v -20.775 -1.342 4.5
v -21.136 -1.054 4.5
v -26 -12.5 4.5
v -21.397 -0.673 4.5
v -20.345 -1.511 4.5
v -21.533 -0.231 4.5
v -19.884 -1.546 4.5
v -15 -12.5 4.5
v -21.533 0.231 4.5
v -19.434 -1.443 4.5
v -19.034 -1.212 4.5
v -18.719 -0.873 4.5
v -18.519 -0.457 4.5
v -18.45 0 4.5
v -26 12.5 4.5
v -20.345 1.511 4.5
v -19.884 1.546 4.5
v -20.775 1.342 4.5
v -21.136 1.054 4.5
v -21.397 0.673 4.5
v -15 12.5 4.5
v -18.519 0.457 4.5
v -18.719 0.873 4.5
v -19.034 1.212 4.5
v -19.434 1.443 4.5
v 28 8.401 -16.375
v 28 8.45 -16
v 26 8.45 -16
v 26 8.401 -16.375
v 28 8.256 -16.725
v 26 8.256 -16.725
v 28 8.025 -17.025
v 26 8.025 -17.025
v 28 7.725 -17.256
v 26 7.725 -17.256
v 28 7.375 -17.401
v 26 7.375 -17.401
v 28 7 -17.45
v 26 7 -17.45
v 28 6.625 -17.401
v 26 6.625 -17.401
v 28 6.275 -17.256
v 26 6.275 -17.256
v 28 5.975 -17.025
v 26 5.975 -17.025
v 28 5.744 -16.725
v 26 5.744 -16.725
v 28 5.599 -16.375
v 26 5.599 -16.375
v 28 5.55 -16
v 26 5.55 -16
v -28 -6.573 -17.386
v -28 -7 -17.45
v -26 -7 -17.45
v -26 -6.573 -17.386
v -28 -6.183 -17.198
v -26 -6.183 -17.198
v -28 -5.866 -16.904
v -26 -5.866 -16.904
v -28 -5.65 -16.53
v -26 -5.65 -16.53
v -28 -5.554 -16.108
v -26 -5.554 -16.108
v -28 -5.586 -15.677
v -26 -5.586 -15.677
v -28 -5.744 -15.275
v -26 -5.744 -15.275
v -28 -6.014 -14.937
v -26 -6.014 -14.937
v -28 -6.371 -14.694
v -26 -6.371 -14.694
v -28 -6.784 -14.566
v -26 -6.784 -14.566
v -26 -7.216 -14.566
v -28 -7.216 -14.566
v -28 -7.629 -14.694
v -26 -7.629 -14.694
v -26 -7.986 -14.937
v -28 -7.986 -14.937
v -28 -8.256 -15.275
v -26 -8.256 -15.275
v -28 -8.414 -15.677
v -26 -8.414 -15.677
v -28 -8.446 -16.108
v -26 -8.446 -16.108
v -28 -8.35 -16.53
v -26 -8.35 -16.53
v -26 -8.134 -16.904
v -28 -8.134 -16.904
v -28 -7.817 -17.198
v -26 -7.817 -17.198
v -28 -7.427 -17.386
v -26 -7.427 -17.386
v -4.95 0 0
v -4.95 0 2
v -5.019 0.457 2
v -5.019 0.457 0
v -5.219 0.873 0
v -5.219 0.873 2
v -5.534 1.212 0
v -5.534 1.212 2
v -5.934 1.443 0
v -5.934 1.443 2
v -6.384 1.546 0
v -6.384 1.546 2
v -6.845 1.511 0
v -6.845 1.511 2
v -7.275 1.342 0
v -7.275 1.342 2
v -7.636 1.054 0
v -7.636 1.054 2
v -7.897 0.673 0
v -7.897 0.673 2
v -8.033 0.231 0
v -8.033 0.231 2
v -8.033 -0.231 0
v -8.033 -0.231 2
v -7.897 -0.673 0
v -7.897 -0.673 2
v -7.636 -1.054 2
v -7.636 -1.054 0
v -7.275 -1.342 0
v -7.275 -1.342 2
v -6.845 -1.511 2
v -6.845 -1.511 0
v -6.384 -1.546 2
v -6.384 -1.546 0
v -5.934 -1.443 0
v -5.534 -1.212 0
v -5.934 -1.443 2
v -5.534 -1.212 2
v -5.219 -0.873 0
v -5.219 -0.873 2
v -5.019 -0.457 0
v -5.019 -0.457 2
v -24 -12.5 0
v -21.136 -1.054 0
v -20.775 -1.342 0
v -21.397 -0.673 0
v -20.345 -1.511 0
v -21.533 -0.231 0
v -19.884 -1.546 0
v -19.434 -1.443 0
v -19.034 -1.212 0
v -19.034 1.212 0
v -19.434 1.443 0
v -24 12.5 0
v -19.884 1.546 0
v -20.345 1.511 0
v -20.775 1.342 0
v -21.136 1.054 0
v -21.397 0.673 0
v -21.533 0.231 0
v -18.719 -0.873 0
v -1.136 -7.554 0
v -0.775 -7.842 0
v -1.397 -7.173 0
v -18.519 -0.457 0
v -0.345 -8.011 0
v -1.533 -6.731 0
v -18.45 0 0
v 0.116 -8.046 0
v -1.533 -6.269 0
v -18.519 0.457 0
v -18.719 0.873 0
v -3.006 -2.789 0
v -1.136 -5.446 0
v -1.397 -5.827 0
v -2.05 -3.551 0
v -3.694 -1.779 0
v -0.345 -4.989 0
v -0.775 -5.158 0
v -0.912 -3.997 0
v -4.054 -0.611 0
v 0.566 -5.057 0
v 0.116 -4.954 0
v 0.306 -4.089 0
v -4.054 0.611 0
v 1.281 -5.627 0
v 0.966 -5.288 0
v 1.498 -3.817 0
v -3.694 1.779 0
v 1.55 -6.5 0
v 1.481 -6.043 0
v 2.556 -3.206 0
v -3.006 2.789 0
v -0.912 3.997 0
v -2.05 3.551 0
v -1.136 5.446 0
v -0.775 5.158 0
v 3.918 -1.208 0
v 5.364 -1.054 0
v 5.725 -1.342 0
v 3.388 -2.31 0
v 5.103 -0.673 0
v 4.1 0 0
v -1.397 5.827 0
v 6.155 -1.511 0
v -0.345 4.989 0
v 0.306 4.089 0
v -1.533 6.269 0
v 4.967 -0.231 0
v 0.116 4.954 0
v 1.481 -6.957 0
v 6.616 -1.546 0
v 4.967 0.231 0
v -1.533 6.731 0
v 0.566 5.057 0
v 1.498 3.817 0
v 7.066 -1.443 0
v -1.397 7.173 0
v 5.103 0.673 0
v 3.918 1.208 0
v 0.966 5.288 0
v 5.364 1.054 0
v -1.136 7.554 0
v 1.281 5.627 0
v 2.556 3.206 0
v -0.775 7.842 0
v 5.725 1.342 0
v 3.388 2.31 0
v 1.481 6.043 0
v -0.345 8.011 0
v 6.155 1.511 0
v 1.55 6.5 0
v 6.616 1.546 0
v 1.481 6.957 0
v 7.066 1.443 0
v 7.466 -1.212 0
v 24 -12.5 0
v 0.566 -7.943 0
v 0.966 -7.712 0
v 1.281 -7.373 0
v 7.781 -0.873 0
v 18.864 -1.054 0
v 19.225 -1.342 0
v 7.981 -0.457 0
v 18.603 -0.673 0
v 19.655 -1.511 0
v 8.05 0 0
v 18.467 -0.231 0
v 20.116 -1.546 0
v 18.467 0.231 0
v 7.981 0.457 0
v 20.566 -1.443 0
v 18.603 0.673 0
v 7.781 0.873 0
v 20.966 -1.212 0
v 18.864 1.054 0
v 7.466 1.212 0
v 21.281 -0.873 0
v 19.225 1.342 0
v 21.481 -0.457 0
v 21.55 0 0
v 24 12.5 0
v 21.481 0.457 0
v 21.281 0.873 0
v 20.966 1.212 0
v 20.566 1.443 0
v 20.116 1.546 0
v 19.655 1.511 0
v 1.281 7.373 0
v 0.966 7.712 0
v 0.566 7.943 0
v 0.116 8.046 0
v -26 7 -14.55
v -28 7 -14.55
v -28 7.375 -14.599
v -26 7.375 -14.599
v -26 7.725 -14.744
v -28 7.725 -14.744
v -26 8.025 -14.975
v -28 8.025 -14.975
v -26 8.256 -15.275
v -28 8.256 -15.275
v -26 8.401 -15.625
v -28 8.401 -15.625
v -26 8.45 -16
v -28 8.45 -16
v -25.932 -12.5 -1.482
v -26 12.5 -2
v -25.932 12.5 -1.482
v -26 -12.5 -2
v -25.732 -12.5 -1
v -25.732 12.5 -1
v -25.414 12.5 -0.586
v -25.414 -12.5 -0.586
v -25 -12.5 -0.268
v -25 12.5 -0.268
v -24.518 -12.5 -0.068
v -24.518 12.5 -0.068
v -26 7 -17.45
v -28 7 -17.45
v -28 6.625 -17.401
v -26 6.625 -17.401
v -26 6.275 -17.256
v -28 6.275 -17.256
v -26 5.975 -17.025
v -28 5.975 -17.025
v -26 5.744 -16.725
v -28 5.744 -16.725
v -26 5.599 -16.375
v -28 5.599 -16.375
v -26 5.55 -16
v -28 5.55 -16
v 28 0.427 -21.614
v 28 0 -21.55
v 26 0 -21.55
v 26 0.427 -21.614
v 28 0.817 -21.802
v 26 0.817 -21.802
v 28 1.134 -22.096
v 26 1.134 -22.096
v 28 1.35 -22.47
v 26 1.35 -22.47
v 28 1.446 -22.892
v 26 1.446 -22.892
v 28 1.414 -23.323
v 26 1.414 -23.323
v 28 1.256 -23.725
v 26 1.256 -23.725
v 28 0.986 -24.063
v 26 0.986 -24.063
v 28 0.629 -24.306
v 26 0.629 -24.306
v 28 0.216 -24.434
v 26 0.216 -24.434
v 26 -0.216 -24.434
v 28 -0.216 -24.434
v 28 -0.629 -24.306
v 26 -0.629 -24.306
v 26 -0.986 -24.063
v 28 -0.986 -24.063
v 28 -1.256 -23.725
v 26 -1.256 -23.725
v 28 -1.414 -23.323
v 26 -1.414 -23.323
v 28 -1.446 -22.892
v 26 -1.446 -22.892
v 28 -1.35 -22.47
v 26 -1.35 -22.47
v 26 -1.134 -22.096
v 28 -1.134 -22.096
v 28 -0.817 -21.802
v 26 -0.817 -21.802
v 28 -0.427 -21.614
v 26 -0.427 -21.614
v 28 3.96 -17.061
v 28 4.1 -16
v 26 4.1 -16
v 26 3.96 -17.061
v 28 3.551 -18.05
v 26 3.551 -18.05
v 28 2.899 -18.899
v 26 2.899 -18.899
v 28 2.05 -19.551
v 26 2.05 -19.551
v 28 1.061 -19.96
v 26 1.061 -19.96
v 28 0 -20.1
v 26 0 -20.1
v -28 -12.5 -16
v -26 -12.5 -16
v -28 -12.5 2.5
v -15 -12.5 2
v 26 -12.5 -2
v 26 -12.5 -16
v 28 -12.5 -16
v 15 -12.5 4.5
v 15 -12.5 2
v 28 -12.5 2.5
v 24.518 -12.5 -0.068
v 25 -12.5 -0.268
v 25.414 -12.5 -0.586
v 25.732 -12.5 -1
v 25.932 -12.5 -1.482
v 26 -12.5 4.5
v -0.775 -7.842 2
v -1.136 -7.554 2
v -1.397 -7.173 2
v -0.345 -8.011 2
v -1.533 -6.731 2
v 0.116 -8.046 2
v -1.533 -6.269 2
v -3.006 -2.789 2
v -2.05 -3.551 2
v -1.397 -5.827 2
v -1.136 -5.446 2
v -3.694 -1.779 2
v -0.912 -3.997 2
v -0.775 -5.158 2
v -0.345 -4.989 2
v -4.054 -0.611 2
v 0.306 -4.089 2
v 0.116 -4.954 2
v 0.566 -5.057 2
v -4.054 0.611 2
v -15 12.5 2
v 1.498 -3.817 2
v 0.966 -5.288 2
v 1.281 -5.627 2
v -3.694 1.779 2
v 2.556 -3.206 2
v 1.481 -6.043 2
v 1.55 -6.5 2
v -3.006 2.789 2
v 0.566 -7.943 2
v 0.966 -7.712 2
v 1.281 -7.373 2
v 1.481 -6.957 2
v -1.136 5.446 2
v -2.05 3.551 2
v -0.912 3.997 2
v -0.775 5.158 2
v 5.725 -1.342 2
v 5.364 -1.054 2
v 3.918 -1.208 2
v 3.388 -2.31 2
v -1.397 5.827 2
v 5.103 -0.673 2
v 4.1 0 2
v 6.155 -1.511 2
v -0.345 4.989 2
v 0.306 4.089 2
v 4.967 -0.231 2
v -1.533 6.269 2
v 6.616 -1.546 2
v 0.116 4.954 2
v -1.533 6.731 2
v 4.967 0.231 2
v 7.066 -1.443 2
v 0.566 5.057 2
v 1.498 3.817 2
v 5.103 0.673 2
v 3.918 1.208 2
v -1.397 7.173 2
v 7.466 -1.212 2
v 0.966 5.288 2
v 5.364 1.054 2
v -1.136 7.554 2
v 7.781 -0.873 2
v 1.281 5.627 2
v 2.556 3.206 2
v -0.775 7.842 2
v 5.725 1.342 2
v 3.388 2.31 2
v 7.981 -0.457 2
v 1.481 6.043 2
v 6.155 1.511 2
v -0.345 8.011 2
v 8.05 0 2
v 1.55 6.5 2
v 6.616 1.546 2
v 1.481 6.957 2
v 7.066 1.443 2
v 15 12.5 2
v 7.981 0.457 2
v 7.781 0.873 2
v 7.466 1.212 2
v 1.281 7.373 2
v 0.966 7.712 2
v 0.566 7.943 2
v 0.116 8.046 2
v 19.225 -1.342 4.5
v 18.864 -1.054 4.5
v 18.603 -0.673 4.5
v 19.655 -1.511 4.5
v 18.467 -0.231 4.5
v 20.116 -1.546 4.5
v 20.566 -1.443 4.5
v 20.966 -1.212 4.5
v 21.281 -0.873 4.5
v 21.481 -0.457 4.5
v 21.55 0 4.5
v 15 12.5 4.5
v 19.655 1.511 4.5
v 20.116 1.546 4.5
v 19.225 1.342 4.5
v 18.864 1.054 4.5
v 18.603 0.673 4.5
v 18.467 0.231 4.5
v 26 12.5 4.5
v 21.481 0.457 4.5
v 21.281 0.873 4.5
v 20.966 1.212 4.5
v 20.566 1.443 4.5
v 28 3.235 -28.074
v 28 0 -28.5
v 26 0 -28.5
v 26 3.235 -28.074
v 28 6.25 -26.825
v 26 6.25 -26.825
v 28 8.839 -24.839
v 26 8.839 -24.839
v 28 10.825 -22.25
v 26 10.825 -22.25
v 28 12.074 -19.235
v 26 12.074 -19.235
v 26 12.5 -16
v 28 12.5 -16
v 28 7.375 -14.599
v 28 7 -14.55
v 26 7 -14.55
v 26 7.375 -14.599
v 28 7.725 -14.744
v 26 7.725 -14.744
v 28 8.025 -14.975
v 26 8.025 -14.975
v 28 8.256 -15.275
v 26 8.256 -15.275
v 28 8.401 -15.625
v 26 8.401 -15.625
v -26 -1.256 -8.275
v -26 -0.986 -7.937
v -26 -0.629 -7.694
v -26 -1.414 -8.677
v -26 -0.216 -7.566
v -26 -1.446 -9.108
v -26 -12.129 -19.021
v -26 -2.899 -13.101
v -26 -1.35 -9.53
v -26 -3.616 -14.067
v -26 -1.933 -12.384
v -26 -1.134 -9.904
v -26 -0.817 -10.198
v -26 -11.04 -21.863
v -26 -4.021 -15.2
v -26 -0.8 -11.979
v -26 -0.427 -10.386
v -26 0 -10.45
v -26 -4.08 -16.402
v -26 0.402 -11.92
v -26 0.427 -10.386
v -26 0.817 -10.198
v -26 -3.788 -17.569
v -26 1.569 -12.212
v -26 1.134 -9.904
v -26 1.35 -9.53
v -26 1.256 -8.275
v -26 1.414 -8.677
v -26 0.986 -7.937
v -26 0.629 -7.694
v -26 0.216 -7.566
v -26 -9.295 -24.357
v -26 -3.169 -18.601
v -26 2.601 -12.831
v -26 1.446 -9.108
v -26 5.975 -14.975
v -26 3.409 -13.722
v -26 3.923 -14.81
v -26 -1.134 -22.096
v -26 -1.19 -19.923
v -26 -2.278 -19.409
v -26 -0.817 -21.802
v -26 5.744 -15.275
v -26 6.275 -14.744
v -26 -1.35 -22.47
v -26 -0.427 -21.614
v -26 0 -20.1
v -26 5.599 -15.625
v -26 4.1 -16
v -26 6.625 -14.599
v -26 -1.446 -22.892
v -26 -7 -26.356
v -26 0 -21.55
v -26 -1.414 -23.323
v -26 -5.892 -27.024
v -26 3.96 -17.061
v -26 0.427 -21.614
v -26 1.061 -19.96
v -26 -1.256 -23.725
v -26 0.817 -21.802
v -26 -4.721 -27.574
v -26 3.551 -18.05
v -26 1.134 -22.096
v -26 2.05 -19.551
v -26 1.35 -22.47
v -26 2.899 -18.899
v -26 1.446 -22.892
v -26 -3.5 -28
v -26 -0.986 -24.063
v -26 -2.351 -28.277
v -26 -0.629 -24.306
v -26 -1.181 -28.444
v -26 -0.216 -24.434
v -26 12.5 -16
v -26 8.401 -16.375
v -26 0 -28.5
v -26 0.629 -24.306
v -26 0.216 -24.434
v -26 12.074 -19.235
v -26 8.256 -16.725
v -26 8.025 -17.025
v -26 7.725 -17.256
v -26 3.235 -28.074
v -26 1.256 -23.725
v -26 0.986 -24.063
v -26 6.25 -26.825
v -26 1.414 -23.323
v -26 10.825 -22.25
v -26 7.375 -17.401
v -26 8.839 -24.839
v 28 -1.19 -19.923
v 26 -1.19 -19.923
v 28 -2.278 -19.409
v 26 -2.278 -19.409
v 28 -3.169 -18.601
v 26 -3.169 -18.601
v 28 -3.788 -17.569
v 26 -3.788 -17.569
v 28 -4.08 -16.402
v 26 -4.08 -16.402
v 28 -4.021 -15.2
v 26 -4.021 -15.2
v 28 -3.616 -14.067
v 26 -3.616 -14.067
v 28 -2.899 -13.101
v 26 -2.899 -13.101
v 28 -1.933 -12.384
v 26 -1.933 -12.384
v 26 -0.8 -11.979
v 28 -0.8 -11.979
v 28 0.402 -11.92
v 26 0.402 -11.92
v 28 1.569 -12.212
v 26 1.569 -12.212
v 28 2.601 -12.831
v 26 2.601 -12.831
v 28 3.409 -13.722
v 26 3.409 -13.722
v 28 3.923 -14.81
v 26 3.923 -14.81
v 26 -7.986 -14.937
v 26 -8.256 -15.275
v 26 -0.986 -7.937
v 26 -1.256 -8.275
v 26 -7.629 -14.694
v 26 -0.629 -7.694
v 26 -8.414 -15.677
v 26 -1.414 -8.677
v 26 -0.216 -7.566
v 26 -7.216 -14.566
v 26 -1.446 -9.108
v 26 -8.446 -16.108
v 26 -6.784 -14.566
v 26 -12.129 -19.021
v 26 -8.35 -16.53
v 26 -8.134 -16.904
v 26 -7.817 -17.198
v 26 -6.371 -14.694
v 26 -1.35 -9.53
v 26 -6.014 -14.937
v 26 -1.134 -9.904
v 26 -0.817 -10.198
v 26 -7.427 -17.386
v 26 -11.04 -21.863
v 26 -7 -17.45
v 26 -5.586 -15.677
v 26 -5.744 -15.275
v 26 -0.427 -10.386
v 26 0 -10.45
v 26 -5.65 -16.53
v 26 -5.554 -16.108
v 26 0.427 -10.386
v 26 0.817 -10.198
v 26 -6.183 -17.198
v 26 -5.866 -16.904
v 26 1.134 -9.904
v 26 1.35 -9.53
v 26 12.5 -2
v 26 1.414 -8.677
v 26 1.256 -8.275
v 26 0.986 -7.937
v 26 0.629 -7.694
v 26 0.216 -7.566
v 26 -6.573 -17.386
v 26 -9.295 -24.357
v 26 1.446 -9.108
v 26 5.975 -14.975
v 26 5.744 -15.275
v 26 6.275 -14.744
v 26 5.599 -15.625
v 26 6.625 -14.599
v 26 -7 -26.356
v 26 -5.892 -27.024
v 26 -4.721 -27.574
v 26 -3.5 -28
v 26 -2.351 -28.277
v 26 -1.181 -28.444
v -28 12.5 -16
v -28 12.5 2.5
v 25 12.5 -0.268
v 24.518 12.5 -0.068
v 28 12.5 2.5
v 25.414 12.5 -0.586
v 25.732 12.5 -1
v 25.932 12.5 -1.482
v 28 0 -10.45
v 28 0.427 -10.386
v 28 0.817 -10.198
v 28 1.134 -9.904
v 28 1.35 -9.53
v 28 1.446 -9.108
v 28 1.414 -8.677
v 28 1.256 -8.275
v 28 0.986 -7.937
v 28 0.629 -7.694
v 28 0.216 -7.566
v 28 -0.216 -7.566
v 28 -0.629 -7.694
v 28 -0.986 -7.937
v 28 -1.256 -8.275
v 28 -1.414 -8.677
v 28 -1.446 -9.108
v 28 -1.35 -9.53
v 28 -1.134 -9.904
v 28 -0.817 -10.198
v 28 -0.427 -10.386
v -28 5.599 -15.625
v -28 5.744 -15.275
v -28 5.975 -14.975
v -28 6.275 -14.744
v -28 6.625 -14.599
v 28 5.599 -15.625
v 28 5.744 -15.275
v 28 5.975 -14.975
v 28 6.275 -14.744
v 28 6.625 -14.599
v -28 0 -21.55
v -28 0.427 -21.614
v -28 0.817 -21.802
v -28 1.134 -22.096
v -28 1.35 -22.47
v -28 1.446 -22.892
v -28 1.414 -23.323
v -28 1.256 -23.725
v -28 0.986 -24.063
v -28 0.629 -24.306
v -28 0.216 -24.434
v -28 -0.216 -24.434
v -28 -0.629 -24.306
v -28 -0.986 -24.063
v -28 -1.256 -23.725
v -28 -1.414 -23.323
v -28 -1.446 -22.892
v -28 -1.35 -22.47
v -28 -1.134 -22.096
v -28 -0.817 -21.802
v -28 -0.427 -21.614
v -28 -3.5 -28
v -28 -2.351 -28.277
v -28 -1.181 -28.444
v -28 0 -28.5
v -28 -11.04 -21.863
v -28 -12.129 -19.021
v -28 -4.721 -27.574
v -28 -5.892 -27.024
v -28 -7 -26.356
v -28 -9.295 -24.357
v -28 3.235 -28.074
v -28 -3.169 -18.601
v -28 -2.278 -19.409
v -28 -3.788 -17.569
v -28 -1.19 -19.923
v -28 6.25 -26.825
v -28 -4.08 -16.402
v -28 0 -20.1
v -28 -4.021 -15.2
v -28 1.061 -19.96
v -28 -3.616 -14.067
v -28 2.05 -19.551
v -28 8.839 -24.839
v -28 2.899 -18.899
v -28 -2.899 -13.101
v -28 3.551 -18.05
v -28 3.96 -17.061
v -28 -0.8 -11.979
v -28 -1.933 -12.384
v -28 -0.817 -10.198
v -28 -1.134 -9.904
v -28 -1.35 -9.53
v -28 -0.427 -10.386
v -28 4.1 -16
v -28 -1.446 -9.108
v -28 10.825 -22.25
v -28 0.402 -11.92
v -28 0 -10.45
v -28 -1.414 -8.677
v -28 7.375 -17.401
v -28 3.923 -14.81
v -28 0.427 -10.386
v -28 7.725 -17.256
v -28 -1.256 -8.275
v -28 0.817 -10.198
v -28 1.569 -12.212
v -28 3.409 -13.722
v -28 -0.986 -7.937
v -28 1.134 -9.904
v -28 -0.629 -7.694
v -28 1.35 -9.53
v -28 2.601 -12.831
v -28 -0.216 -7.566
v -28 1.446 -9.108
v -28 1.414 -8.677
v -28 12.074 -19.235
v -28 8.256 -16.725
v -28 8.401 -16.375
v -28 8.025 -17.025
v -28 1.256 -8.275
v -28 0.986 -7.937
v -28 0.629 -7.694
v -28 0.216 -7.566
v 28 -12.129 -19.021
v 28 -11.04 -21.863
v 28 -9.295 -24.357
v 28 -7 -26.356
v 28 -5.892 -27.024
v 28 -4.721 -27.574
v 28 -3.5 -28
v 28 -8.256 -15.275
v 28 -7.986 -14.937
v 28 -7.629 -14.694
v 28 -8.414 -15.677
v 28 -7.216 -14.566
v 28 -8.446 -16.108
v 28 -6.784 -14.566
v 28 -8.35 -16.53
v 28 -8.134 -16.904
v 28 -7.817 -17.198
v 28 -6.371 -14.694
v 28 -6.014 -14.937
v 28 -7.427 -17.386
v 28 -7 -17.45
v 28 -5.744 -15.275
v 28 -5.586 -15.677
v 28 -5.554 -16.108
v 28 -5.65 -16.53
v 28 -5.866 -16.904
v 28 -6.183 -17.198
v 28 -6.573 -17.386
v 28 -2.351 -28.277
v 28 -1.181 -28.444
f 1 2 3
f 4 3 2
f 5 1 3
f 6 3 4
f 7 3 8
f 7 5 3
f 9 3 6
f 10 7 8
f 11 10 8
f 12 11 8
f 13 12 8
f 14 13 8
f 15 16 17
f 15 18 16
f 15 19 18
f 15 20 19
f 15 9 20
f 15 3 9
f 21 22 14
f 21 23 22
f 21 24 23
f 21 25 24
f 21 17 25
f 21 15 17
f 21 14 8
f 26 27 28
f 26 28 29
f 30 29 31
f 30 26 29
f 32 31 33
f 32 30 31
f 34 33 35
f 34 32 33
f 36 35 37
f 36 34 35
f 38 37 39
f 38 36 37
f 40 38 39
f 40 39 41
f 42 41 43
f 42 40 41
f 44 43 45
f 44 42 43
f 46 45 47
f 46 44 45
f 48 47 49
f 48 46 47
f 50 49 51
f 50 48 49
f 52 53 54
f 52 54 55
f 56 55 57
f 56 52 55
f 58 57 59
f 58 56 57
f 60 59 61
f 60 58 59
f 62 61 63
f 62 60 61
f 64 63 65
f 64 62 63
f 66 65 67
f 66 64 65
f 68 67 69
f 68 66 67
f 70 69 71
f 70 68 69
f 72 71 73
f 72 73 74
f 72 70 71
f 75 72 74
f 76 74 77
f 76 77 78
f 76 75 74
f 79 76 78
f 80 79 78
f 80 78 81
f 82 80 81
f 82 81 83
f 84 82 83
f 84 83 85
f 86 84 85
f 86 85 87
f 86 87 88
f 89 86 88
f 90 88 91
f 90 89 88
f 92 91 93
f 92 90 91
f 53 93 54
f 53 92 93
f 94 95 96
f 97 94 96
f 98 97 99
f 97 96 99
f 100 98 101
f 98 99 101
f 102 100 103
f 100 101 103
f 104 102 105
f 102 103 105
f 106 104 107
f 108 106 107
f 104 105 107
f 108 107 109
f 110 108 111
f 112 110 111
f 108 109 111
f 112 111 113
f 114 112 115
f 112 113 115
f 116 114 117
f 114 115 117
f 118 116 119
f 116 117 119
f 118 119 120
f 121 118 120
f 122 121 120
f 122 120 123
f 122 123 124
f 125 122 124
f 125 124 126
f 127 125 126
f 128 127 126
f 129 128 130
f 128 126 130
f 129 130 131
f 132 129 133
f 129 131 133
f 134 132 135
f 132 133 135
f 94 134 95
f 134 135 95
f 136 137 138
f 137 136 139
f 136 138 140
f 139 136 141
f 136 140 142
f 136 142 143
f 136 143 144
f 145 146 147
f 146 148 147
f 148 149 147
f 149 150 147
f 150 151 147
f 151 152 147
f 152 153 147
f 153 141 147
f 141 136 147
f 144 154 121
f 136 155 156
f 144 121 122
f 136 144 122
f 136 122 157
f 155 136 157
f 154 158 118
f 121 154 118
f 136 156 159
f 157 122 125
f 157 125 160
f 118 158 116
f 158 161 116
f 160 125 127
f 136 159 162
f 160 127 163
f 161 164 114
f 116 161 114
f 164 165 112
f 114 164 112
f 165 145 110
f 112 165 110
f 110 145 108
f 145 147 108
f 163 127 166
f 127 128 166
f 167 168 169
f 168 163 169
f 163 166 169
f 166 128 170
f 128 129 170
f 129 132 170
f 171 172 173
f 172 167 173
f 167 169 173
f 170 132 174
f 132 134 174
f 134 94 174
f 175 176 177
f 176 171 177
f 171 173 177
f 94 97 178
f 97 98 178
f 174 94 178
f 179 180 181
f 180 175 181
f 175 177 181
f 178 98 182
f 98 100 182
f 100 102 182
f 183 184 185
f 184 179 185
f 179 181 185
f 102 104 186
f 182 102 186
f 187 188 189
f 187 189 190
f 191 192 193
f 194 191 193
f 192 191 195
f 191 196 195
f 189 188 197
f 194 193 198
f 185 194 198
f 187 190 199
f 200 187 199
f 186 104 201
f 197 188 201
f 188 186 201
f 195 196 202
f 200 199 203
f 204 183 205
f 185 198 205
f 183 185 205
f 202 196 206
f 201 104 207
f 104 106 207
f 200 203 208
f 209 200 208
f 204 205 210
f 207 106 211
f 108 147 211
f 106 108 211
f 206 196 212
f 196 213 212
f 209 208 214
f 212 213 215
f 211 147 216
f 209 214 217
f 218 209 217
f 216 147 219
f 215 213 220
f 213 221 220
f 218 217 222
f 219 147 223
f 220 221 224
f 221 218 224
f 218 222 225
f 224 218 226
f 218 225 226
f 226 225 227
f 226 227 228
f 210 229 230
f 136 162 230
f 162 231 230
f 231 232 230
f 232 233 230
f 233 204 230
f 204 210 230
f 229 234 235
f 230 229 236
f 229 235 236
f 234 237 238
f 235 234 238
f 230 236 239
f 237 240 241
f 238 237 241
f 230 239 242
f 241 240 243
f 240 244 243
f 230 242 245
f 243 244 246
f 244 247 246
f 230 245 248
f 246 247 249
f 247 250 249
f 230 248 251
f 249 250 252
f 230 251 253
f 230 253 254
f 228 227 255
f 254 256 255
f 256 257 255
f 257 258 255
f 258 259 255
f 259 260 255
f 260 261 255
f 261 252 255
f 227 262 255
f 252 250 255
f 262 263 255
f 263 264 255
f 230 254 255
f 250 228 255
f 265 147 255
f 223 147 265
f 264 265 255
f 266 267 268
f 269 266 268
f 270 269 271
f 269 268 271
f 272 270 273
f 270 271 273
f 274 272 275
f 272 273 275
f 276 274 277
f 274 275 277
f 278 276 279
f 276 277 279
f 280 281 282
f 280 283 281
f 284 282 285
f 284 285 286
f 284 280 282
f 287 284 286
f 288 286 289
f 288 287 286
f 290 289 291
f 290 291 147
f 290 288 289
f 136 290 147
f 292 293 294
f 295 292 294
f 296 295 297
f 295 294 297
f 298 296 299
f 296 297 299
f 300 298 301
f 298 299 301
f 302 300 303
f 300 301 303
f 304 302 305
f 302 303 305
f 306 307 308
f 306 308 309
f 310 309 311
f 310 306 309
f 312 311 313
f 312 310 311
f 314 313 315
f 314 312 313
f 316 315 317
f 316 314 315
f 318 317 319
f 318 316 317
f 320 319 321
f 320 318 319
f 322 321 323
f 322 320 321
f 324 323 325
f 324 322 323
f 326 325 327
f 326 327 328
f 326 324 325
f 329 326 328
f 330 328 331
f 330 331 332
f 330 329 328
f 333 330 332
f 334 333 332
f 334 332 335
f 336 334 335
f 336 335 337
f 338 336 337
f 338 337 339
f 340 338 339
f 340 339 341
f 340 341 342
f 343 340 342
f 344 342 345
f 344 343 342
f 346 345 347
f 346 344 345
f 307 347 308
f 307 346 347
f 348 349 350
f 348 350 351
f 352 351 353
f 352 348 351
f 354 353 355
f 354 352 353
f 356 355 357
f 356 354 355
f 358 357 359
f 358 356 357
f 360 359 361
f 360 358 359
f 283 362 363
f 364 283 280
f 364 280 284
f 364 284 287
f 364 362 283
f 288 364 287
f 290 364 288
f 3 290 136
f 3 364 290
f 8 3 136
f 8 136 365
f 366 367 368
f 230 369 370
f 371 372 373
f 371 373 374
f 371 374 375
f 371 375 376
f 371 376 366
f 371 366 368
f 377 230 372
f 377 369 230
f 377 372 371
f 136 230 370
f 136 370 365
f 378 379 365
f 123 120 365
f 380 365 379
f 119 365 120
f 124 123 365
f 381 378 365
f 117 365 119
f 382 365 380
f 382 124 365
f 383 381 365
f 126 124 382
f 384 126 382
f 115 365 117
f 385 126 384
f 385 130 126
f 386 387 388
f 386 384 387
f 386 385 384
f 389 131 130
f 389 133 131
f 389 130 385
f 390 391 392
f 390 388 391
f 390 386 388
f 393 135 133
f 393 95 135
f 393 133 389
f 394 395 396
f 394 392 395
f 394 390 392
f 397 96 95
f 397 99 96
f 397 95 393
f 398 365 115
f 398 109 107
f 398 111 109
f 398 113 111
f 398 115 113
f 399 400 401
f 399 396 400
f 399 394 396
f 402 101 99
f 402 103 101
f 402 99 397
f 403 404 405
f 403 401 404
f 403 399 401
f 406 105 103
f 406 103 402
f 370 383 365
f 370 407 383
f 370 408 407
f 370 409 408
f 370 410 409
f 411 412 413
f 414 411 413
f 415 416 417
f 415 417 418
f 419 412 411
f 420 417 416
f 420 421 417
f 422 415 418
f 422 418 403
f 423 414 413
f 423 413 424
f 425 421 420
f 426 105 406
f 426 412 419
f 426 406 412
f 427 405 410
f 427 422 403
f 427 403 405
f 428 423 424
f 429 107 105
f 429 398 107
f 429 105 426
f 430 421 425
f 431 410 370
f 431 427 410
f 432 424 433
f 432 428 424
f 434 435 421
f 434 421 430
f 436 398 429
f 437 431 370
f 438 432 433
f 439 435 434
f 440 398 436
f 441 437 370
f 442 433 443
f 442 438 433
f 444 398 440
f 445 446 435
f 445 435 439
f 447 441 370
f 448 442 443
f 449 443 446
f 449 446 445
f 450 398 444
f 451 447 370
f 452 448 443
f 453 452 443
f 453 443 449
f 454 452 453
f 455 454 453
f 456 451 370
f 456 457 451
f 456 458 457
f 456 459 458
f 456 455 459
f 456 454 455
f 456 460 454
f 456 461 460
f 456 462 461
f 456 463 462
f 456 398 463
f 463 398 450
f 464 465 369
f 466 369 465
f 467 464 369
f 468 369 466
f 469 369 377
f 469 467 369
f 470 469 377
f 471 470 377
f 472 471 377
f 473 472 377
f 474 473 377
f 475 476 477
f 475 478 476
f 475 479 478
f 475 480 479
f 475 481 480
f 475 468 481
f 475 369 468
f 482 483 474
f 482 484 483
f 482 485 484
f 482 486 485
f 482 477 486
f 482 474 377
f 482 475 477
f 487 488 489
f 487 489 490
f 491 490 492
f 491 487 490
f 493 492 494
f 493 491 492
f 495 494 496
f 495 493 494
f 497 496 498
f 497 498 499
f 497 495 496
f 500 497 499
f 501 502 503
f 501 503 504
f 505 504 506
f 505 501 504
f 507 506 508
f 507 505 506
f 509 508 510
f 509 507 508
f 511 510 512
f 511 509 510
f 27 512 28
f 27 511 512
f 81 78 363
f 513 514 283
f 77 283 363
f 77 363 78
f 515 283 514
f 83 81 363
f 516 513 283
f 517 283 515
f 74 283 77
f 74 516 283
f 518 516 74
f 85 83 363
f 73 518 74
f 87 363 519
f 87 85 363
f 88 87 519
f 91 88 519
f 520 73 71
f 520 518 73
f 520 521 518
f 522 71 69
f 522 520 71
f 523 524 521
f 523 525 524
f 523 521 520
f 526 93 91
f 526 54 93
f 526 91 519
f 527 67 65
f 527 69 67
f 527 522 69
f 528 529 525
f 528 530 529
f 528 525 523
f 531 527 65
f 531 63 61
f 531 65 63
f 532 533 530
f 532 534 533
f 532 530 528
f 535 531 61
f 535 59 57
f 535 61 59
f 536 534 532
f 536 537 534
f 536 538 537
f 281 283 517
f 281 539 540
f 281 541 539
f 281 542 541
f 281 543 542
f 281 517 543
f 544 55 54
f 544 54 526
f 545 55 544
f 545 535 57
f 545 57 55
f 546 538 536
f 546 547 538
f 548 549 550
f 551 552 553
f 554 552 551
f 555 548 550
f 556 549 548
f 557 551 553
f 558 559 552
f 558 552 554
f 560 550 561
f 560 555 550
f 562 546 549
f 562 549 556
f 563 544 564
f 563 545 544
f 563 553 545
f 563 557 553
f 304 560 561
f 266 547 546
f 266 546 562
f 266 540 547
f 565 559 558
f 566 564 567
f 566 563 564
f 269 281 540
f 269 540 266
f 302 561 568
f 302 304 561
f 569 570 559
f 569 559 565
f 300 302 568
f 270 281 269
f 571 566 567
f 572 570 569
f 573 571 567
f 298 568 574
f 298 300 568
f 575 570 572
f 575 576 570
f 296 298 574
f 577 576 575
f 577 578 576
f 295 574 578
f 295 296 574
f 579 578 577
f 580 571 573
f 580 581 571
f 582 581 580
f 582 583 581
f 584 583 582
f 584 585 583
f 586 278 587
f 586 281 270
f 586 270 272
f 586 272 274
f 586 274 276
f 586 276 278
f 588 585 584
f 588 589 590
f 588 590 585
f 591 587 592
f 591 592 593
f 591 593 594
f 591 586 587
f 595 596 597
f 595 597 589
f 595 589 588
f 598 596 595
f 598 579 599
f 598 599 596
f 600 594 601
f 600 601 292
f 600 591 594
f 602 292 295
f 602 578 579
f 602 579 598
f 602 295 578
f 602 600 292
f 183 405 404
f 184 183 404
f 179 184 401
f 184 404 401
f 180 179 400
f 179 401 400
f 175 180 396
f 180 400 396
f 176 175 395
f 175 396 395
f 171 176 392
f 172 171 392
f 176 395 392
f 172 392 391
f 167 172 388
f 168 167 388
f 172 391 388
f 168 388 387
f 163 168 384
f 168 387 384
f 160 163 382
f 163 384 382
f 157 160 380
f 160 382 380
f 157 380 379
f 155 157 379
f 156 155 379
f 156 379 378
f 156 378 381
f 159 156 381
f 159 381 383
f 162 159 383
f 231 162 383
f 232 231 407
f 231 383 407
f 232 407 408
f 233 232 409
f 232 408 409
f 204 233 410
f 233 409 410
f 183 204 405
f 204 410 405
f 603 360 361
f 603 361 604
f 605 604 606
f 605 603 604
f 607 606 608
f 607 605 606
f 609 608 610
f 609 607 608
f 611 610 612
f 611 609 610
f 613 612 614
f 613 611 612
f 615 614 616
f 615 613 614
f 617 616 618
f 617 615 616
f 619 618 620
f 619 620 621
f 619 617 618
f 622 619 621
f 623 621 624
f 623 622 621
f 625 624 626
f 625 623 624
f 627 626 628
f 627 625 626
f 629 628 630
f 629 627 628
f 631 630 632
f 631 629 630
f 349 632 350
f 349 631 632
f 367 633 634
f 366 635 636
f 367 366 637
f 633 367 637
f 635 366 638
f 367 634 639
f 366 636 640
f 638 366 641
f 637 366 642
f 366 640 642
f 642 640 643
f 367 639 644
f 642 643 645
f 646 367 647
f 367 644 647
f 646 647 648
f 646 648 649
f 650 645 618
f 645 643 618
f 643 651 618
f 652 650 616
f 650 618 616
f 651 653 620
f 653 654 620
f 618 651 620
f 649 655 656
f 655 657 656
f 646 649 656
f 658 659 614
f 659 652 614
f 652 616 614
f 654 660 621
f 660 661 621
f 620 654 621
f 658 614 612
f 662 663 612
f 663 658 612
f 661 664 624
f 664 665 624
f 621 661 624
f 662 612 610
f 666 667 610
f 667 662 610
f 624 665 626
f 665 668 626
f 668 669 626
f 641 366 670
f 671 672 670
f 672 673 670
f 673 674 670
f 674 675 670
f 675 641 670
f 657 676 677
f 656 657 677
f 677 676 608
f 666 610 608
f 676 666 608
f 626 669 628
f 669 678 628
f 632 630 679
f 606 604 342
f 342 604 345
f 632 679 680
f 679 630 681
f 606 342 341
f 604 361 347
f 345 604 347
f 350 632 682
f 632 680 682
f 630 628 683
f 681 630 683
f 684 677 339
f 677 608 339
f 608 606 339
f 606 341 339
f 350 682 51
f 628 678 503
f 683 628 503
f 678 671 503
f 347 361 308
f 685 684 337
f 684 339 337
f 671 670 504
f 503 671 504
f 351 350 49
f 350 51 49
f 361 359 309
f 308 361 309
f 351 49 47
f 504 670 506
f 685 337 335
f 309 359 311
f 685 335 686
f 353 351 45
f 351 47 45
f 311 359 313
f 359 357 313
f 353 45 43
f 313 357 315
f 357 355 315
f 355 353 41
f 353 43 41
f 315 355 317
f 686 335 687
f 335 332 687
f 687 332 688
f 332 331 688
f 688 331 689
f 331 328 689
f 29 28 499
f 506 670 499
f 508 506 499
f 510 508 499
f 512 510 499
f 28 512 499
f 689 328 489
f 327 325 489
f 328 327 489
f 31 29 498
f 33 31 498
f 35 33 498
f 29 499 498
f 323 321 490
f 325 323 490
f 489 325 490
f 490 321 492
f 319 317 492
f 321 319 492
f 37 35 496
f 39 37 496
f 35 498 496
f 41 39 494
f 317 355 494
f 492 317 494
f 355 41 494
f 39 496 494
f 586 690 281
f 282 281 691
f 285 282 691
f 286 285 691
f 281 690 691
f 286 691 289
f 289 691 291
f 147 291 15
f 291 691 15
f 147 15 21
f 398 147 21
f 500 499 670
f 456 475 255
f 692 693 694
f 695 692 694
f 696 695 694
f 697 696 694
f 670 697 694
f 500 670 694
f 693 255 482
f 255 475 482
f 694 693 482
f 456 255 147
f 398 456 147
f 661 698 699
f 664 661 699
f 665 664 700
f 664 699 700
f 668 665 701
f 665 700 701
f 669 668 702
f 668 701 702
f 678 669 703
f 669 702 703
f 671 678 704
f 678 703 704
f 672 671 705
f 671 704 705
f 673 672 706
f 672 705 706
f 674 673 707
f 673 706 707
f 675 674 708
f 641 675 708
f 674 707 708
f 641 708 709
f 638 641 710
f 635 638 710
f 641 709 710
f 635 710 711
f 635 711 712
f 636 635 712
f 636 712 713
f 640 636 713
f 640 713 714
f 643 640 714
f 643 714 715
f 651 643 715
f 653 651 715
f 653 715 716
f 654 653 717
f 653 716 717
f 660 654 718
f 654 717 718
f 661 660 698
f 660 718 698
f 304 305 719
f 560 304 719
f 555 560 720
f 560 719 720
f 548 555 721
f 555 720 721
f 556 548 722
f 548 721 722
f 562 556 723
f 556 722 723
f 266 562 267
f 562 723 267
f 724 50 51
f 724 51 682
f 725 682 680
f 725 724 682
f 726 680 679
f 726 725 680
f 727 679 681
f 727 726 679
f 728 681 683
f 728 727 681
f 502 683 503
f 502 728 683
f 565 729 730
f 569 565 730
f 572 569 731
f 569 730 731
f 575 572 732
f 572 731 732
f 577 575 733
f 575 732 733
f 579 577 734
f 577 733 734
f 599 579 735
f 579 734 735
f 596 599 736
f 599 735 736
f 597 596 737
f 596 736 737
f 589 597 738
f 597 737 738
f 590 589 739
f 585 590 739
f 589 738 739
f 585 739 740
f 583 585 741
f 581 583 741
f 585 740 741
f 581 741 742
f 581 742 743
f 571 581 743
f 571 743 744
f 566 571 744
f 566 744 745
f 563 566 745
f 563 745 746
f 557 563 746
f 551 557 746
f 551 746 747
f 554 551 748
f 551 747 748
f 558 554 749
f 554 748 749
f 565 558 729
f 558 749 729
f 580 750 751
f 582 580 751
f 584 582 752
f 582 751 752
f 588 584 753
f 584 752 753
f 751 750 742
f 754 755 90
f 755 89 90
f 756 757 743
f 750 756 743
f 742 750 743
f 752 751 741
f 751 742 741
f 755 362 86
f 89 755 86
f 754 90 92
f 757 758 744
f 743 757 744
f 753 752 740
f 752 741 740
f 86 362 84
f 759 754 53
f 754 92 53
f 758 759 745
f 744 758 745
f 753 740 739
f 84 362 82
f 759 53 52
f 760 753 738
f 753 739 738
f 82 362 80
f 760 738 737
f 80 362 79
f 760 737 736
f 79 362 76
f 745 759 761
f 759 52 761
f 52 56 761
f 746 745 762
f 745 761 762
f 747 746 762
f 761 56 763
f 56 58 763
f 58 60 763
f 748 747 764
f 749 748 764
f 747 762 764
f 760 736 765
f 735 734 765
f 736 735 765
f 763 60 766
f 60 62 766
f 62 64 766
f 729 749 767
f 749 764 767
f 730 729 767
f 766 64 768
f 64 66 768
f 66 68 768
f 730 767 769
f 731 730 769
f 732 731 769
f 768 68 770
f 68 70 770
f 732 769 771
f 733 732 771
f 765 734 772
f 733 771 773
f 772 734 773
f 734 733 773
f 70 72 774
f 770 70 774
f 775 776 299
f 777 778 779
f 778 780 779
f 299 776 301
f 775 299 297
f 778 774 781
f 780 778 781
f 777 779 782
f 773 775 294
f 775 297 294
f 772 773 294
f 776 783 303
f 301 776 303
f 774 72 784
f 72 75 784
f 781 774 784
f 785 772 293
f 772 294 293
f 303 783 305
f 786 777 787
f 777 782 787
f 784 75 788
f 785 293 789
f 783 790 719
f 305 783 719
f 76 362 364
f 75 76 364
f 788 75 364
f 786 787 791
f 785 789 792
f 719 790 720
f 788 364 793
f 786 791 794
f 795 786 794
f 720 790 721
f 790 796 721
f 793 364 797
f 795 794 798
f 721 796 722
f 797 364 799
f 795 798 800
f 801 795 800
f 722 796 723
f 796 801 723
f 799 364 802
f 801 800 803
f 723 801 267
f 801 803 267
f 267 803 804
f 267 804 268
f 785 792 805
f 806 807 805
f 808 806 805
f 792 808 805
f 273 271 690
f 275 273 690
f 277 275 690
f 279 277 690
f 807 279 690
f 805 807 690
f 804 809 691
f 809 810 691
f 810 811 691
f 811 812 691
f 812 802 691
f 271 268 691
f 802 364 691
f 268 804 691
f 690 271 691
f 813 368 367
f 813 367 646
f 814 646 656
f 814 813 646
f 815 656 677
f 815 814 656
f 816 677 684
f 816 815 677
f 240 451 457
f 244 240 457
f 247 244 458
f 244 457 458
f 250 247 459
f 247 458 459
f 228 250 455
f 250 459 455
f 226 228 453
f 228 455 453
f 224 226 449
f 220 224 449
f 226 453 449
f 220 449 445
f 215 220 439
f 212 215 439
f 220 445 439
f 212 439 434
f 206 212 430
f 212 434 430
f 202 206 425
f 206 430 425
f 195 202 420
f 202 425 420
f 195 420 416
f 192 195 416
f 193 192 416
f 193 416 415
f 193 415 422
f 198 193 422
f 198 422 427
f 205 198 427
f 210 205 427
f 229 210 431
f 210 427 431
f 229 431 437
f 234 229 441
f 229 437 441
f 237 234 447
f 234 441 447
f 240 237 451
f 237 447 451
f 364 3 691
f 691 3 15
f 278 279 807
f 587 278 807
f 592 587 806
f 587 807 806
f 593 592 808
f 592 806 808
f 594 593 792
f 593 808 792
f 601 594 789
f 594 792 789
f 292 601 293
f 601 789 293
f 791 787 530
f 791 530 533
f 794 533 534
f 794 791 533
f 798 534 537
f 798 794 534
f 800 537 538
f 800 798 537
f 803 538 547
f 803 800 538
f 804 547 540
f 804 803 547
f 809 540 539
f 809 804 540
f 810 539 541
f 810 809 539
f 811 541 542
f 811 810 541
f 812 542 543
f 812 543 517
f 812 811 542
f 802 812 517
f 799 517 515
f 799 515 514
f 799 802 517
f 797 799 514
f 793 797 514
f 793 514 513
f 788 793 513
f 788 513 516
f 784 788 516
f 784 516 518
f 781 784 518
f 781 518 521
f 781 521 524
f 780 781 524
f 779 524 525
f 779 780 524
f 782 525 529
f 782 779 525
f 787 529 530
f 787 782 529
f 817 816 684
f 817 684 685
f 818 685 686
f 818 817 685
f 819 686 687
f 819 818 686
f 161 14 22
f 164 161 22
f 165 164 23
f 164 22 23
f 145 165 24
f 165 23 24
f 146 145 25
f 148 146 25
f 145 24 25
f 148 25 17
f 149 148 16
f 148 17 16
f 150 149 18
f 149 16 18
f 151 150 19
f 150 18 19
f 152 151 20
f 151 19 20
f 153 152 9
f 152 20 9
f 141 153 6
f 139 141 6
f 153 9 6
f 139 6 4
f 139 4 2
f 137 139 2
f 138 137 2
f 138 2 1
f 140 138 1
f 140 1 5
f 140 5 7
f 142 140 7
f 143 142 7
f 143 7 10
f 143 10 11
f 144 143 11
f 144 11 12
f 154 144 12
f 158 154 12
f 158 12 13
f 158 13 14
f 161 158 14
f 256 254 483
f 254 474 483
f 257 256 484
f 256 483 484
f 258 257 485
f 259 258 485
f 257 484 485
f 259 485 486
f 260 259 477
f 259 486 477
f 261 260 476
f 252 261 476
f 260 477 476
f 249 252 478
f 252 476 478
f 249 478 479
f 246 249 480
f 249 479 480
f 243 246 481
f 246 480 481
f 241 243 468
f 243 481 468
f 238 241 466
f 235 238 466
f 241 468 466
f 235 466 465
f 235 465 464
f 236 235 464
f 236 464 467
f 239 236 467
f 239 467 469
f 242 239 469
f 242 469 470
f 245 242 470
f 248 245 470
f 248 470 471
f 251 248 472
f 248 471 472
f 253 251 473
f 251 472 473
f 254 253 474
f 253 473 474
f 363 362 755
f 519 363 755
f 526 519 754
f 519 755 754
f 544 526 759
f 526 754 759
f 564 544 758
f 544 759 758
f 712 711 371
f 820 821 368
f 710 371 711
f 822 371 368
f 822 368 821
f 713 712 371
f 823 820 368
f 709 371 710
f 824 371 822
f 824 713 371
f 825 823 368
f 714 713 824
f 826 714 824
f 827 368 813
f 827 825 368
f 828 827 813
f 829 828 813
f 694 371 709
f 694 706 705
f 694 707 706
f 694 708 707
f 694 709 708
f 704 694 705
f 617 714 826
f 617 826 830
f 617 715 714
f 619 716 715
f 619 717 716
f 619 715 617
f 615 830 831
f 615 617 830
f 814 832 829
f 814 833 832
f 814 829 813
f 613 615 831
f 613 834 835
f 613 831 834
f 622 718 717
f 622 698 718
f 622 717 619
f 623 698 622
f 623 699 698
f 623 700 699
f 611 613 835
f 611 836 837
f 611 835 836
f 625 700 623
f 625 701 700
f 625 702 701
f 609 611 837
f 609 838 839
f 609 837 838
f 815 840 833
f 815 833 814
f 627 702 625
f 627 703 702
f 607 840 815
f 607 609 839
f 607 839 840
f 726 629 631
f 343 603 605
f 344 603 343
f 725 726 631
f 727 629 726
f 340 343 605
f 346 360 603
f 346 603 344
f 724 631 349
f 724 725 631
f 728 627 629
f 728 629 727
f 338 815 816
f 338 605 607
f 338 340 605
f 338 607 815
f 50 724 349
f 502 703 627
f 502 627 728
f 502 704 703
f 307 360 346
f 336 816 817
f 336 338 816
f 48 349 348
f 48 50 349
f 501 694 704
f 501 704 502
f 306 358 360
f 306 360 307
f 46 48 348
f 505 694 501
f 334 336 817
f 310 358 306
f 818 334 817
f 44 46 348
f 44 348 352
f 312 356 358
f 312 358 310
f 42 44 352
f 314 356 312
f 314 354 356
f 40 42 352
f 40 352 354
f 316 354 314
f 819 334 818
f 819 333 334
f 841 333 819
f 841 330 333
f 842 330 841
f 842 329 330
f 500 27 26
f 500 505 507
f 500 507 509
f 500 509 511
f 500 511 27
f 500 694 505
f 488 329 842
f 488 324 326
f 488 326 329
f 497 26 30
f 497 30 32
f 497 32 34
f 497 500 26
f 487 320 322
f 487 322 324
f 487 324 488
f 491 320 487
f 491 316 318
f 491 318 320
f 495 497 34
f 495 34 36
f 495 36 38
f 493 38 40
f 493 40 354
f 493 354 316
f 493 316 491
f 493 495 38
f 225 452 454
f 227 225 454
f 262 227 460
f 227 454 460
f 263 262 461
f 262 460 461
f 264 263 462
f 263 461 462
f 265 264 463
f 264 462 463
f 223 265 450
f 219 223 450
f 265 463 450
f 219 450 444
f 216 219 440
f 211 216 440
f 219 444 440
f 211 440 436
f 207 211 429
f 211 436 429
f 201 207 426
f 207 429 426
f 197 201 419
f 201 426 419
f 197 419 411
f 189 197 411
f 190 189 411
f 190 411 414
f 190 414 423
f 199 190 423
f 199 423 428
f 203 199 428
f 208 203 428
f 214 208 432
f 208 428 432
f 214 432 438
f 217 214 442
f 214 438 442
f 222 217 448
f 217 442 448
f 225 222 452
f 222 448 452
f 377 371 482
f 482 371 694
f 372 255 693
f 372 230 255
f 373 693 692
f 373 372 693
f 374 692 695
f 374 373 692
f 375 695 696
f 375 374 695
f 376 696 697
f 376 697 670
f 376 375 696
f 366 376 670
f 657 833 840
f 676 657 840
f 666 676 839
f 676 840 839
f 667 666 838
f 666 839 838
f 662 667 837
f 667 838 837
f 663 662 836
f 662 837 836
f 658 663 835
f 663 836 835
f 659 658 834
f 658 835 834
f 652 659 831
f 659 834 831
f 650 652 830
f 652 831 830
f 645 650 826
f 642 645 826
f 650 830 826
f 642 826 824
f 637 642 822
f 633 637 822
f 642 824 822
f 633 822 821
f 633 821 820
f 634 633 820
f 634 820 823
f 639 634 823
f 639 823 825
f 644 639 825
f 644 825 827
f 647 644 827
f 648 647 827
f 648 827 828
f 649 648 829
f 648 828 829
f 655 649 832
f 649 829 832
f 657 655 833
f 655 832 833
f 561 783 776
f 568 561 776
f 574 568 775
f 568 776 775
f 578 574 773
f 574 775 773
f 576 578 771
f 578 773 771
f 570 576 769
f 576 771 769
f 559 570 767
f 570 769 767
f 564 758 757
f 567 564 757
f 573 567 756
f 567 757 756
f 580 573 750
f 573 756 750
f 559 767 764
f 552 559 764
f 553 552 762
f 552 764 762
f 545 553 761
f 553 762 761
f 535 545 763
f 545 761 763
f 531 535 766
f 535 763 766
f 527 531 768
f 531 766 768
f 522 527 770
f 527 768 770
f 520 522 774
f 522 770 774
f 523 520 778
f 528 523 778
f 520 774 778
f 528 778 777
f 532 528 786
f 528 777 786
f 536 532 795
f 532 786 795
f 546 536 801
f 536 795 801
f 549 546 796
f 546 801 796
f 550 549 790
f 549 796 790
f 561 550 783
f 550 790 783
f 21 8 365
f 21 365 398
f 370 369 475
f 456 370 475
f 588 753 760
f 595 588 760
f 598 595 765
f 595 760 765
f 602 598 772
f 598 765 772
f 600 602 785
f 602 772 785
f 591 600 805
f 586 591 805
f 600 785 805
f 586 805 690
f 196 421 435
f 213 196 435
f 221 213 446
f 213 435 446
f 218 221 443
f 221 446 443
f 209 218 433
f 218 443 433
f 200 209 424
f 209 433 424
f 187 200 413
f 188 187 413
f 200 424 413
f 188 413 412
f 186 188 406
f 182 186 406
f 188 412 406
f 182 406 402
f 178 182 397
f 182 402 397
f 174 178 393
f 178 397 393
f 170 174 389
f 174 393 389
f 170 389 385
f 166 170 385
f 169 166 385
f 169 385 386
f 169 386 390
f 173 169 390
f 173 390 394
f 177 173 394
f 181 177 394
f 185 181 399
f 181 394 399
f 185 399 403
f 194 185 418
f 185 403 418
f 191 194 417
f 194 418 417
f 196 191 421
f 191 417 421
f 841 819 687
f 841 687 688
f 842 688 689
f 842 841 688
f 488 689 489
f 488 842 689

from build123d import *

# Parameters (mm, degrees)
SKETCH_1_W          = 56
SKETCH_1_H          = 25
EXTRUDE_1_DEPTH     = 2
SKETCH_2_R          = 1.45
EXTRUDE_2_DEPTH     = 2
SKETCH_3_R          = 1.55
SKETCH_3_R_2        = 4.1
CUT_EXTRUDE_1_DEPTH = 2
FILLET_1_R          = 2
EXTRUDE_START       = 2.5
SKETCH_4_W          = 13
SKETCH_4_H          = 25
SKETCH_4_R          = 1.55
EXTRUDE_3_DEPTH     = 2.5
CHAMFER_1_SIZE      = 2


with BuildPart() as part:
    # Sketch 1 → Extrude 1 (new body)
    with BuildSketch(Plane.XY):
        Rectangle(SKETCH_1_W, SKETCH_1_H)
    extrude(amount=EXTRUDE_1_DEPTH)

    # Sketch 2 → Extrude 2 (add)
    with BuildSketch(Plane(origin=(28, 0, 0), x_dir=(0, 0, -1), z_dir=(1, 0, 0))):
        with BuildLine():
            Line((16, 12.5), (0, 12.5))
            Line((0, 12.5), (0, -12.5))
            Line((0, -12.5), (16, -12.5))
            ThreePointArc((16, -12.5), (21.8630197, -11.039701083), (26.356157589, -7))
            ThreePointArc((26.356157589, -7), (27.31423641, -5.313949046), (28, -3.5))
            ThreePointArc((28, -3.5), (28.374368671, -1.767766953), (28.5, 0))
            ThreePointArc((28.5, 0), (24.838834765, 8.838834765), (16, 12.5))
        make_face()
        with Locations((9, 0)):
            Circle(SKETCH_2_R, mode=Mode.SUBTRACT)
        with Locations((16, -7)):
            Circle(SKETCH_2_R, mode=Mode.SUBTRACT)
        with BuildLine():
            ThreePointArc((16, 4.1), (18.899137803, 2.899137803), (20.1, 0))
            ThreePointArc((20.1, 0), (13.100862197, -2.899137803), (16, 4.1))
        make_face(mode=Mode.SUBTRACT)
        with BuildLine():
            ThreePointArc((24.45, 0), (23, -1.45), (21.55, 0))
            ThreePointArc((21.55, 0), (23, 1.45), (24.45, 0))
        make_face(mode=Mode.SUBTRACT)
        with BuildLine():
            ThreePointArc((17.45, 7), (17.025304833, 5.974695167), (16, 5.55))
            ThreePointArc((16, 5.55), (14.974695167, 5.974695167), (14.55, 7))
            ThreePointArc((14.55, 7), (14.974695167, 8.025304833), (16, 8.45))
            ThreePointArc((16, 8.45), (17.025304833, 8.025304833), (17.45, 7))
        make_face(mode=Mode.SUBTRACT)
    extrude_2 = extrude(amount=-EXTRUDE_2_DEPTH)

    # Mirror 2: Extrude 2 across plane
    add(extrude_2.mirror(Plane.ZY))

    # Sketch 3 → Cut-Extrude 1 (cut)
    with BuildSketch(Plane.XY.offset(2)):
        with Locations((-20, 0)):
            Circle(SKETCH_3_R)
        with Locations((-6.5, 0)):
            Circle(SKETCH_3_R)
        with Locations((6.5, 0)):
            Circle(SKETCH_3_R)
        with Locations((0, -6.5)):
            Circle(SKETCH_3_R)
        Circle(SKETCH_3_R_2)
        with Locations((0, 6.5)):
            Circle(SKETCH_3_R)
        with Locations((20, 0)):
            Circle(SKETCH_3_R)
    extrude(amount=-CUT_EXTRUDE_1_DEPTH, mode=Mode.SUBTRACT)

    # Fillet 1
    fillet_1_edges = [part.edges().sort_by_distance(p)[0] for p in [
        (26, 0, 0),
        (-26, 0, 0),
    ]]
    fillet(fillet_1_edges, radius=FILLET_1_R)

    # Sketch 4 → Extrude 3 (add)
    # profile 1 of 2: a face of its own
    with BuildSketch(Plane.XY.offset(2).offset(EXTRUDE_START)):
        with Locations((-21.5, 0)):
            Rectangle(SKETCH_4_W, SKETCH_4_H)
        with Locations((-20, 0)):
            Circle(SKETCH_4_R, mode=Mode.SUBTRACT)
    # profile 2 of 2: a face of its own
    with BuildSketch(Plane.XY.offset(2).offset(EXTRUDE_START)):
        with Locations((21.5, 0)):
            Rectangle(SKETCH_4_W, SKETCH_4_H)
        with Locations((20, 0)):
            Circle(SKETCH_4_R, mode=Mode.SUBTRACT)
    extrude(amount=-EXTRUDE_3_DEPTH)

    # Chamfer 1
    chamfer_1_edges = [part.edges().sort_by_distance(p)[0] for p in [
        (-28, 0, 4.5),
        (28, 0, 4.5),
    ]]
    chamfer(chamfer_1_edges, length=CHAMFER_1_SIZE)


solid = part.part
